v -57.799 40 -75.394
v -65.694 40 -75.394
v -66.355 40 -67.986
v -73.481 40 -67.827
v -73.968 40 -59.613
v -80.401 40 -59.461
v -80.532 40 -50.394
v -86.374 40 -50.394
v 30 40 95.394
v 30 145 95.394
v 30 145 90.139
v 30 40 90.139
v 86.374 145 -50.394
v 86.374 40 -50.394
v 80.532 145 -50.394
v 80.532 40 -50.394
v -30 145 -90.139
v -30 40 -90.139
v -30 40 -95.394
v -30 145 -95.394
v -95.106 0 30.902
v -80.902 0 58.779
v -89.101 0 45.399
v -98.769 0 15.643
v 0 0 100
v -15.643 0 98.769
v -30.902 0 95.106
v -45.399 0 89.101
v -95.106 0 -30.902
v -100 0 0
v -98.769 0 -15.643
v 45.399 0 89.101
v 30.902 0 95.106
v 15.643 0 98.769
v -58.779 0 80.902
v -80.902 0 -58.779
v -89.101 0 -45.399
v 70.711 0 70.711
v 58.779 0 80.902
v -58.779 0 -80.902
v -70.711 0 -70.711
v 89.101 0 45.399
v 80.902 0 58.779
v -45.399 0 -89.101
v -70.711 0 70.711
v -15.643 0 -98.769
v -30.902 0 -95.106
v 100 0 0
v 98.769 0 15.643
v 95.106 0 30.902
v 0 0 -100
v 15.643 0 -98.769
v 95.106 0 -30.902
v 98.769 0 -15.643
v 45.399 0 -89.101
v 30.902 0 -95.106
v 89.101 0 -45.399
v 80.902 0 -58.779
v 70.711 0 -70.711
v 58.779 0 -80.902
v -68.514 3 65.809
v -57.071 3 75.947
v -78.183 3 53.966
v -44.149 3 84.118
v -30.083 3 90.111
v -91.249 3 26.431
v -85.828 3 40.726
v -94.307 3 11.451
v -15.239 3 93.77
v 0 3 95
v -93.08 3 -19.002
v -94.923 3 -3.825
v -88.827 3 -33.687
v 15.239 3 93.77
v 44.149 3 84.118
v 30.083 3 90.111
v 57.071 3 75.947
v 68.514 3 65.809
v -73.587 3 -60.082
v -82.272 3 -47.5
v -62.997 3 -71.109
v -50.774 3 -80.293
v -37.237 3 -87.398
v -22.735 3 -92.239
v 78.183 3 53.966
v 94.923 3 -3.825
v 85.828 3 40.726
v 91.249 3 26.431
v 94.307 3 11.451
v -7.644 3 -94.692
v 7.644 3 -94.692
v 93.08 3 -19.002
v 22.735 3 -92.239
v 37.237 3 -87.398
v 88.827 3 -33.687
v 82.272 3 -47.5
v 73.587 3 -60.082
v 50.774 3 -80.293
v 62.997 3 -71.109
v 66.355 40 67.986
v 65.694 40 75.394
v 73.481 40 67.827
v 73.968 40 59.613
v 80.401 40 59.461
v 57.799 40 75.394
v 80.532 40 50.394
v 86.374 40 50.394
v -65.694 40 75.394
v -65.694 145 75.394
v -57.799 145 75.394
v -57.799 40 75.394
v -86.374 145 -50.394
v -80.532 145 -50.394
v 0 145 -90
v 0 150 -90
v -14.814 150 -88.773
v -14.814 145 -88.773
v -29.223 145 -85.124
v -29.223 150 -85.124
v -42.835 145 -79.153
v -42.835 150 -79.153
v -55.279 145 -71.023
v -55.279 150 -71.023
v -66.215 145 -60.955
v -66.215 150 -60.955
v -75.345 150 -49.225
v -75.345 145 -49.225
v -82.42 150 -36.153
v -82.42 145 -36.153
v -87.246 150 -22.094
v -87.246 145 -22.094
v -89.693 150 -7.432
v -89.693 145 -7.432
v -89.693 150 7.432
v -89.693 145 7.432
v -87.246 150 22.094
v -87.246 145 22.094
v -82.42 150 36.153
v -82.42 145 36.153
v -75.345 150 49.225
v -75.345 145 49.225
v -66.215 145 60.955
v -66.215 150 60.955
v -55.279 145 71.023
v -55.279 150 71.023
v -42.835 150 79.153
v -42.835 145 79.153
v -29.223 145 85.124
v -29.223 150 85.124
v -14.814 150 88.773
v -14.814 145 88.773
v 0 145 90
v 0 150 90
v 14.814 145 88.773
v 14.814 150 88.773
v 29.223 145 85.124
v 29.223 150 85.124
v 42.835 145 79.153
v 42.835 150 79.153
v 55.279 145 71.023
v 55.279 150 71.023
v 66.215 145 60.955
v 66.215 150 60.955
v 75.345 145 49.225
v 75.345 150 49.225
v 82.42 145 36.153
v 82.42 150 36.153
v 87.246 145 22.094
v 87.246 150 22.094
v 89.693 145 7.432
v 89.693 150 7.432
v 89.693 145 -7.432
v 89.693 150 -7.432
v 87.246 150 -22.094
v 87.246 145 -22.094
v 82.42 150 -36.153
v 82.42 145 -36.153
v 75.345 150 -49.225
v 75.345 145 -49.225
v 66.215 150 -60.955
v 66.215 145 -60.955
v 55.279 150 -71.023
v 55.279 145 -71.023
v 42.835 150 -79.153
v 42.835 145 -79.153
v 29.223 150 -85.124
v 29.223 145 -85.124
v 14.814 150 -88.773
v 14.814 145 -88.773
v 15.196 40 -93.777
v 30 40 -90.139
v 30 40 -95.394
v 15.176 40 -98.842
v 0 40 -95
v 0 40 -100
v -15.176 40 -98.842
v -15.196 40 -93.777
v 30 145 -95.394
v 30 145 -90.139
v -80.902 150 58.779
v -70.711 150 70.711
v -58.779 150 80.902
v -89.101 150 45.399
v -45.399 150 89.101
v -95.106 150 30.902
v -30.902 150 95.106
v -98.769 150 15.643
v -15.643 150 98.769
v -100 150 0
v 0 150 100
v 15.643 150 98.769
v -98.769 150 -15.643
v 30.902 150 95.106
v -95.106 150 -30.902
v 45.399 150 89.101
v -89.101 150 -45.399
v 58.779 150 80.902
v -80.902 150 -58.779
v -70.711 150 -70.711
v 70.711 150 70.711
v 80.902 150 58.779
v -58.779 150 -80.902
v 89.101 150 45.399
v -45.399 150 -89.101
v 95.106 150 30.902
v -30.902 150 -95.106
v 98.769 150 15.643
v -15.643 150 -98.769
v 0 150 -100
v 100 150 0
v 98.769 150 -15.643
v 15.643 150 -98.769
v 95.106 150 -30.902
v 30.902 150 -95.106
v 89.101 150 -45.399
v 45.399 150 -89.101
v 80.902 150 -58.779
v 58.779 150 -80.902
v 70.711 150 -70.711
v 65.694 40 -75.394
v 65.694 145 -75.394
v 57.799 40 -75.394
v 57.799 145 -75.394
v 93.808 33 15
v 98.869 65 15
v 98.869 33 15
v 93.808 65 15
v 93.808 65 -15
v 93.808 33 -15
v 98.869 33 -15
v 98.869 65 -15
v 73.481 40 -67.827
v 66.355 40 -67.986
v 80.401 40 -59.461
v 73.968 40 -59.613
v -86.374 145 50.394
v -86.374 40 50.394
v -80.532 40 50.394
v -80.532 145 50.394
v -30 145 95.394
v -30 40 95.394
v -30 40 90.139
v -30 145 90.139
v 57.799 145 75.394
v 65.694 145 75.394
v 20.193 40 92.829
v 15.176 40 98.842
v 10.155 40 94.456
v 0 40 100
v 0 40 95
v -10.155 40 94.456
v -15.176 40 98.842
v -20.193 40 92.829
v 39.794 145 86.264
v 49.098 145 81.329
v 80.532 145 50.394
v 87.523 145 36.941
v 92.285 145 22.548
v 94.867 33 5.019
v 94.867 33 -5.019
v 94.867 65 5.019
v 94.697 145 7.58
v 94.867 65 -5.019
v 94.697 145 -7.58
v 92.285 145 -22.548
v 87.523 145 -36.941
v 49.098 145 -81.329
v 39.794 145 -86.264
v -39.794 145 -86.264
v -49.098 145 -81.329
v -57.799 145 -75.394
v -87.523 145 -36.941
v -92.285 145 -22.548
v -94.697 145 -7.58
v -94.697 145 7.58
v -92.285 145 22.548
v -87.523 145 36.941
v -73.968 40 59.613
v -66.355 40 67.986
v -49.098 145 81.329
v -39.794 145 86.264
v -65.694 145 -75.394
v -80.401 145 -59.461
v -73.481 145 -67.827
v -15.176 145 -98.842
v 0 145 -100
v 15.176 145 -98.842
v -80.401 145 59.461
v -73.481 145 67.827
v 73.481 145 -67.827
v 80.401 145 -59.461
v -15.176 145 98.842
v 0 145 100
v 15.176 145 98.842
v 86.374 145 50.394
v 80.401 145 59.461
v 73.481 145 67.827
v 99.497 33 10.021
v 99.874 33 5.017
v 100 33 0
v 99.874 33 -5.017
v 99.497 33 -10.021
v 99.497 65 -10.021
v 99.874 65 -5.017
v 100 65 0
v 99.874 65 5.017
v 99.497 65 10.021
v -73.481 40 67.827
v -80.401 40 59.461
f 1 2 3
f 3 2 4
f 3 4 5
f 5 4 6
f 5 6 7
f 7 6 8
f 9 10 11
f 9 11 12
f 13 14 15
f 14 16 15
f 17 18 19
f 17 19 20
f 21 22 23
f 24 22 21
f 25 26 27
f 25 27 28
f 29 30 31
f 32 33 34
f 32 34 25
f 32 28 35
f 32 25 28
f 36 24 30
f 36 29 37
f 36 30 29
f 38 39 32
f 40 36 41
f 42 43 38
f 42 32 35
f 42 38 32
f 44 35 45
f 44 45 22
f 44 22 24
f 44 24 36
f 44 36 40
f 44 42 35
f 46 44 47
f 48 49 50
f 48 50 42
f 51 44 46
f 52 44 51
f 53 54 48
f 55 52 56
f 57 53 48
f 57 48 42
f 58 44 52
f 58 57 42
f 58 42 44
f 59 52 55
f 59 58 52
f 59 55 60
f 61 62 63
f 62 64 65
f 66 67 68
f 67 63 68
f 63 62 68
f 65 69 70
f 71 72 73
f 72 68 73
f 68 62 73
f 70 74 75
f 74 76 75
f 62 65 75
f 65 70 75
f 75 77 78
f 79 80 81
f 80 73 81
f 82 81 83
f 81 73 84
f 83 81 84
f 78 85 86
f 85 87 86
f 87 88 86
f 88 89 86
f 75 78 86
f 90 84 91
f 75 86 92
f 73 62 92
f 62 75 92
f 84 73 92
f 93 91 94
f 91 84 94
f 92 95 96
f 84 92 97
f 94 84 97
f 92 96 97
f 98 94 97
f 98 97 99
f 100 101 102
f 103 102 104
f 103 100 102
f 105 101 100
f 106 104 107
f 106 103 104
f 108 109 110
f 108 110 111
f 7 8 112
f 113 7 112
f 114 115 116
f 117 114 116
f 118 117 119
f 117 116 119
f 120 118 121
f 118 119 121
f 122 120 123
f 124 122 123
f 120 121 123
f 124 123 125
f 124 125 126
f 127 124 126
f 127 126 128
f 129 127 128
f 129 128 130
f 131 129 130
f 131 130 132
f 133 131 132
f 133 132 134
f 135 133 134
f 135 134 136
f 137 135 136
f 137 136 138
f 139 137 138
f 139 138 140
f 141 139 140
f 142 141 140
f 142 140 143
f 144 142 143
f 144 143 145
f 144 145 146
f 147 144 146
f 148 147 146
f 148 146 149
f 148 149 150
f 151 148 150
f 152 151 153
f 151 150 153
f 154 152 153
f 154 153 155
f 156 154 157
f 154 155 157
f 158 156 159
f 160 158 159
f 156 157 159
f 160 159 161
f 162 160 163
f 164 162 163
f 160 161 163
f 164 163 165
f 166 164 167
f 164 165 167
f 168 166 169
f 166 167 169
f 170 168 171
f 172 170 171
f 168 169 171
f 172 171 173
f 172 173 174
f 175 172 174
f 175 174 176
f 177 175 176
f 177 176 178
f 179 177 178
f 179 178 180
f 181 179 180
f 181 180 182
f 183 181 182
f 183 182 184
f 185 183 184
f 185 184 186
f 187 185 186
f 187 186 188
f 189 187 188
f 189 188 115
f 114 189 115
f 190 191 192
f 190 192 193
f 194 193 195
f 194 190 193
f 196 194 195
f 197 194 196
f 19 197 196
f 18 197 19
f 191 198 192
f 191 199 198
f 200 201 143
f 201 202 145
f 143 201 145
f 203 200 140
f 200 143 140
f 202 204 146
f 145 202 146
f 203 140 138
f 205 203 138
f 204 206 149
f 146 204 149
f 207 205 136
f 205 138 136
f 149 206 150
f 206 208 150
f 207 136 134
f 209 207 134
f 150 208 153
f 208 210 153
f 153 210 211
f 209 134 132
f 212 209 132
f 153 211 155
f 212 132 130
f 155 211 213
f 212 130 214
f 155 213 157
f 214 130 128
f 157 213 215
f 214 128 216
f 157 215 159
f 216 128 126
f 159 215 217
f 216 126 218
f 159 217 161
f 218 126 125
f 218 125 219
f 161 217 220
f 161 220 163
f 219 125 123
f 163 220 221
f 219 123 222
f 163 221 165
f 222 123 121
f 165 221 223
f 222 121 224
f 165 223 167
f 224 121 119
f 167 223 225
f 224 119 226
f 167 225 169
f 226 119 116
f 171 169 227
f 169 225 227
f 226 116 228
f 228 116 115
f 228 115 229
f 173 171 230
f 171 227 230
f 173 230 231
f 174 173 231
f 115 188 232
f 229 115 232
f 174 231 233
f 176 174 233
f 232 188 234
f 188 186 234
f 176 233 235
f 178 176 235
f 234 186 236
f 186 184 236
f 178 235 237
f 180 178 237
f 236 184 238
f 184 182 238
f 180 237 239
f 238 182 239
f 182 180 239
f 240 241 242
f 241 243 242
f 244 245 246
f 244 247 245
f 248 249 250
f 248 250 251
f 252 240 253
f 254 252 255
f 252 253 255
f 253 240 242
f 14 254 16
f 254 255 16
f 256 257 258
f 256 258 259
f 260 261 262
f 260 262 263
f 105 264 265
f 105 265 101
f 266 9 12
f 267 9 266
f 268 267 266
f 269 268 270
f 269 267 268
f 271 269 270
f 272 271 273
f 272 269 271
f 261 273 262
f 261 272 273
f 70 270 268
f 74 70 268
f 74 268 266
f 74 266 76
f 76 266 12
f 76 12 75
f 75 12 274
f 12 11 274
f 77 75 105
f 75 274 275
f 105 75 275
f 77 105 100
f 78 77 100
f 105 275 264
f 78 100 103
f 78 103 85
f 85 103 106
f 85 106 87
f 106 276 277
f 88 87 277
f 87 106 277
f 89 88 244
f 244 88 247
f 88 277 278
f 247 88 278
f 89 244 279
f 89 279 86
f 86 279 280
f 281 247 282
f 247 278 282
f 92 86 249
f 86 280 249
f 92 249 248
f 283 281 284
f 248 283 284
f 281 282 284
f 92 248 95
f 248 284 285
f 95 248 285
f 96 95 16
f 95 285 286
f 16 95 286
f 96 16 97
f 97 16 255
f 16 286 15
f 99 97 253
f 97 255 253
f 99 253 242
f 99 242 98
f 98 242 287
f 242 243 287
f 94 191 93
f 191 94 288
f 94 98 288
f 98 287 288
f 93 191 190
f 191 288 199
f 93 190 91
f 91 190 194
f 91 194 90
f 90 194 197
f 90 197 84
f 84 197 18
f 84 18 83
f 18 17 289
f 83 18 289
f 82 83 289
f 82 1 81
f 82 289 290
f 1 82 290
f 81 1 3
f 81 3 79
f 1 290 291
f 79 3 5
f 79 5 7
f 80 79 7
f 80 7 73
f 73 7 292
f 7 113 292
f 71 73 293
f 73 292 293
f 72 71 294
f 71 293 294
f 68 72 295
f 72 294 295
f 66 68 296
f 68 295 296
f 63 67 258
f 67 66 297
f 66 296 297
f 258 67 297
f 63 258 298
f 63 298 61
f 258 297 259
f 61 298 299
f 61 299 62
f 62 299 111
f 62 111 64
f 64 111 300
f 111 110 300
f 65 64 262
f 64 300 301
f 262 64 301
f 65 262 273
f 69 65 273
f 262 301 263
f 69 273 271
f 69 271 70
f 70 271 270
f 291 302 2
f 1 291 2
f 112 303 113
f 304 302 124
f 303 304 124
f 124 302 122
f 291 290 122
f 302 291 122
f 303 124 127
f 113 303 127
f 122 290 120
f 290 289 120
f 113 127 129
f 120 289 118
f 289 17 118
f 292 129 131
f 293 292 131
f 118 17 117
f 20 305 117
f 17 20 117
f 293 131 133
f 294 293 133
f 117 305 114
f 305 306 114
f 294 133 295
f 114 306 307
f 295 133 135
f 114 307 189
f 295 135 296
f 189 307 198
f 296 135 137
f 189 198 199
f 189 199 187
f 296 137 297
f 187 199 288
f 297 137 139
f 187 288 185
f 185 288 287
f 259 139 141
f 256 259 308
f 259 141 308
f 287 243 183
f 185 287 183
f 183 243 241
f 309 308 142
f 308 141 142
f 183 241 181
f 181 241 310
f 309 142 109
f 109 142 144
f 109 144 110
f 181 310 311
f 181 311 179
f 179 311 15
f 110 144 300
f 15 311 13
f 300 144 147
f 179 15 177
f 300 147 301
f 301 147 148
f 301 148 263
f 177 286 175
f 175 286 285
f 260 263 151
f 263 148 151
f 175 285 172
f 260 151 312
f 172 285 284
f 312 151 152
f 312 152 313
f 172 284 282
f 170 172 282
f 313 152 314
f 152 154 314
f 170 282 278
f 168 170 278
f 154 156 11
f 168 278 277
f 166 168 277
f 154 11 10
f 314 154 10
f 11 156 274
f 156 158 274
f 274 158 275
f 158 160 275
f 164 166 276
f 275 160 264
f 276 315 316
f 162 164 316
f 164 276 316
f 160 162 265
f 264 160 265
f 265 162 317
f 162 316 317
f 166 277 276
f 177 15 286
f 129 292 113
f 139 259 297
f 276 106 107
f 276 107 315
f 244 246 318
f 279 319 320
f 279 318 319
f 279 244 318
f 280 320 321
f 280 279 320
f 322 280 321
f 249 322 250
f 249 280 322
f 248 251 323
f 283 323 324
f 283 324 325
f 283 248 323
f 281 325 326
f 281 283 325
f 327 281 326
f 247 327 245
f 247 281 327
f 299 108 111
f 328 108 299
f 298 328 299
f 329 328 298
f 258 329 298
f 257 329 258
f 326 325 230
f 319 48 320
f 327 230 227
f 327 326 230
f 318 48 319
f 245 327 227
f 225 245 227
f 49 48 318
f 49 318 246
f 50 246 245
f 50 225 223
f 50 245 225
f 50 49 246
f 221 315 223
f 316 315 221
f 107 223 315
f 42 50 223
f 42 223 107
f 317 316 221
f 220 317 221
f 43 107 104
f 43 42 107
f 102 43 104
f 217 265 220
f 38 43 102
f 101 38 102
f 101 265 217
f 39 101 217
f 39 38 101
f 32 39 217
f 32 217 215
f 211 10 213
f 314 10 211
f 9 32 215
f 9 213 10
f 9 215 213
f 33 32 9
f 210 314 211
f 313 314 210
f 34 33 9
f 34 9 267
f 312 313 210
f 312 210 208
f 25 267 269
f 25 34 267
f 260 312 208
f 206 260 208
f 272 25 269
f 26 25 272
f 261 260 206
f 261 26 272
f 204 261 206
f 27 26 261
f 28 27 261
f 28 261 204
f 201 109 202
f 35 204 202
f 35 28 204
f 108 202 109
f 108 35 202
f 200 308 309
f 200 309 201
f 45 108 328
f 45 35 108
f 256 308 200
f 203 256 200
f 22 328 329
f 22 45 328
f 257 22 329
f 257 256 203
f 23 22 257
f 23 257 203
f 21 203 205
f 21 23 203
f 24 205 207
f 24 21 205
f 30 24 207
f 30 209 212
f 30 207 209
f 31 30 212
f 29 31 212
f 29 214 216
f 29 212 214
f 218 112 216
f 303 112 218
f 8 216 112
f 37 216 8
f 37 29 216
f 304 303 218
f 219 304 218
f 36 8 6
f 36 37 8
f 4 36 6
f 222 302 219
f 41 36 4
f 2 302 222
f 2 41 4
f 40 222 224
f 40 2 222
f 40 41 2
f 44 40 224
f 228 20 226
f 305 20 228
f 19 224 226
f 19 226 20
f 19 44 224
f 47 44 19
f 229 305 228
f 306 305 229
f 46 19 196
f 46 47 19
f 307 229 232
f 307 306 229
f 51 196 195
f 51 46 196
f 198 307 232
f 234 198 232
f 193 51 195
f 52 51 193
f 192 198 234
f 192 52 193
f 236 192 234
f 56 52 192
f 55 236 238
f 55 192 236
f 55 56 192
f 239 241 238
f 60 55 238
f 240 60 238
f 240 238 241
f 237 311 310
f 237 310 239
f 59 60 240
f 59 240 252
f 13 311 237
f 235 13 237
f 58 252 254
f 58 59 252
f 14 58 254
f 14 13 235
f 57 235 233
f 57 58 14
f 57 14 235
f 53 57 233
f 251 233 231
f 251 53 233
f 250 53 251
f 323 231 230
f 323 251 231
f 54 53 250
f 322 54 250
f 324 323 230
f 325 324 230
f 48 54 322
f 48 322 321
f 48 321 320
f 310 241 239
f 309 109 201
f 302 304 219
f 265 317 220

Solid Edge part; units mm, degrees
sketch "Sketch1" plane through (0, 0, 0) normal (0, -1, 0) x (1, 0, 0)
  circle A0 centre (0, 0) radius 100
extrude "Protrusion1" add sketch "Sketch1" against normal blind 150
sketch "Sketch2" plane through (0, 150, 0) normal (0, 1, 0) x (0, 0, 1)
  circle A0 centre (0, 0) radius 95
extrude "Recorte_Extrudado_2" cut sketch "Sketch2" against normal blind 251.4861
extrude "Recorte_Extrudado_3" [suppressed]
chamfer "Chanfro_1" distance 2 angle 45 1 edges at (0, 150, -95)
fillet "Redondo_1" [suppressed]
extrude "Recorte_Extrudado_5" [suppressed]
sketch "Sketch3" plane through (0, 0, 0) normal (0, -1, 0) x (1, 0, 0)
  circle A0 centre (0, 0) radius 100
extrude "Protrusão_Extrudada_5" add sketch "Sketch3" against normal blind 3
sketch "Sketch4" plane through (0, 0, 0) normal (0, 0, -1) x (-1, 0, 0)
  line L0 (-30, 40) -> (30, 40)
  line L1 (30, 40) -> (30, 260)
  line L2 (30, 260) -> (-30, 260)
  line L3 (-30, 260) -> (-30, 40)
extrude "Recorte_Extrudado_6" cut sketch "Sketch4" along normal mid plane 236.9884
sketch "Sketch5" plane through (0, 0, 0) normal (1, 0, 0) x (0, 1, 0)
  line L0 (65, 0) -> (65, 15)
  line L1 (65, 15) -> (33, 15)
  line L2 (33, 15) -> (33, -15)
  line L3 (33, -15) -> (65, -15)
  line L4 (65, -15) -> (65, 0)
extrude "Recorte_Extrudado_7" cut sketch "Sketch5" along normal blind 114.5948 and the other way blind 44.7082
sketch "Sketch6" plane through (0, 0, 0) normal (1, 0, 0) x (0, 1, 0)
  line L0 (150, 75.3939) -> (40, 75.3939)
  line L1 (40, 75.3939) -> (40, 50.3939)
  line L2 (40, 50.3939) -> (150, 50.3939)
  line L3 (150, 50.3939) -> (150, 75.3939)
  line L4 (150, -75.3939) -> (40, -75.3939)
  line L5 (40, -75.3939) -> (40, -50.3939)
  line L6 (40, -50.3939) -> (150, -50.3939)
  line L7 (150, -50.3939) -> (150, -75.3939)
extrude "Recorte_Extrudado_8" cut sketch "Sketch6" along normal mid plane 298.4716
sketch "Sketch7" plane through (-91.4411, 150, 0) normal (0, 1, 0) x (1, 0, 0)
  circle A0 centre (91.4411, 0) radius 100
extrude "Protrusão_Extrudada_6" add sketch "Sketch7" against normal blind 5
sketch "Sketch8" plane through (0, 150, 0) normal (0, 1, 0) x (0, 0, -1)
  circle A0 centre (0, 0) radius 90
extrude "Recorte_Extrudado_10" cut sketch "Sketch8" against normal up to vertex (5 mm away) and the other way blind 10.5295
